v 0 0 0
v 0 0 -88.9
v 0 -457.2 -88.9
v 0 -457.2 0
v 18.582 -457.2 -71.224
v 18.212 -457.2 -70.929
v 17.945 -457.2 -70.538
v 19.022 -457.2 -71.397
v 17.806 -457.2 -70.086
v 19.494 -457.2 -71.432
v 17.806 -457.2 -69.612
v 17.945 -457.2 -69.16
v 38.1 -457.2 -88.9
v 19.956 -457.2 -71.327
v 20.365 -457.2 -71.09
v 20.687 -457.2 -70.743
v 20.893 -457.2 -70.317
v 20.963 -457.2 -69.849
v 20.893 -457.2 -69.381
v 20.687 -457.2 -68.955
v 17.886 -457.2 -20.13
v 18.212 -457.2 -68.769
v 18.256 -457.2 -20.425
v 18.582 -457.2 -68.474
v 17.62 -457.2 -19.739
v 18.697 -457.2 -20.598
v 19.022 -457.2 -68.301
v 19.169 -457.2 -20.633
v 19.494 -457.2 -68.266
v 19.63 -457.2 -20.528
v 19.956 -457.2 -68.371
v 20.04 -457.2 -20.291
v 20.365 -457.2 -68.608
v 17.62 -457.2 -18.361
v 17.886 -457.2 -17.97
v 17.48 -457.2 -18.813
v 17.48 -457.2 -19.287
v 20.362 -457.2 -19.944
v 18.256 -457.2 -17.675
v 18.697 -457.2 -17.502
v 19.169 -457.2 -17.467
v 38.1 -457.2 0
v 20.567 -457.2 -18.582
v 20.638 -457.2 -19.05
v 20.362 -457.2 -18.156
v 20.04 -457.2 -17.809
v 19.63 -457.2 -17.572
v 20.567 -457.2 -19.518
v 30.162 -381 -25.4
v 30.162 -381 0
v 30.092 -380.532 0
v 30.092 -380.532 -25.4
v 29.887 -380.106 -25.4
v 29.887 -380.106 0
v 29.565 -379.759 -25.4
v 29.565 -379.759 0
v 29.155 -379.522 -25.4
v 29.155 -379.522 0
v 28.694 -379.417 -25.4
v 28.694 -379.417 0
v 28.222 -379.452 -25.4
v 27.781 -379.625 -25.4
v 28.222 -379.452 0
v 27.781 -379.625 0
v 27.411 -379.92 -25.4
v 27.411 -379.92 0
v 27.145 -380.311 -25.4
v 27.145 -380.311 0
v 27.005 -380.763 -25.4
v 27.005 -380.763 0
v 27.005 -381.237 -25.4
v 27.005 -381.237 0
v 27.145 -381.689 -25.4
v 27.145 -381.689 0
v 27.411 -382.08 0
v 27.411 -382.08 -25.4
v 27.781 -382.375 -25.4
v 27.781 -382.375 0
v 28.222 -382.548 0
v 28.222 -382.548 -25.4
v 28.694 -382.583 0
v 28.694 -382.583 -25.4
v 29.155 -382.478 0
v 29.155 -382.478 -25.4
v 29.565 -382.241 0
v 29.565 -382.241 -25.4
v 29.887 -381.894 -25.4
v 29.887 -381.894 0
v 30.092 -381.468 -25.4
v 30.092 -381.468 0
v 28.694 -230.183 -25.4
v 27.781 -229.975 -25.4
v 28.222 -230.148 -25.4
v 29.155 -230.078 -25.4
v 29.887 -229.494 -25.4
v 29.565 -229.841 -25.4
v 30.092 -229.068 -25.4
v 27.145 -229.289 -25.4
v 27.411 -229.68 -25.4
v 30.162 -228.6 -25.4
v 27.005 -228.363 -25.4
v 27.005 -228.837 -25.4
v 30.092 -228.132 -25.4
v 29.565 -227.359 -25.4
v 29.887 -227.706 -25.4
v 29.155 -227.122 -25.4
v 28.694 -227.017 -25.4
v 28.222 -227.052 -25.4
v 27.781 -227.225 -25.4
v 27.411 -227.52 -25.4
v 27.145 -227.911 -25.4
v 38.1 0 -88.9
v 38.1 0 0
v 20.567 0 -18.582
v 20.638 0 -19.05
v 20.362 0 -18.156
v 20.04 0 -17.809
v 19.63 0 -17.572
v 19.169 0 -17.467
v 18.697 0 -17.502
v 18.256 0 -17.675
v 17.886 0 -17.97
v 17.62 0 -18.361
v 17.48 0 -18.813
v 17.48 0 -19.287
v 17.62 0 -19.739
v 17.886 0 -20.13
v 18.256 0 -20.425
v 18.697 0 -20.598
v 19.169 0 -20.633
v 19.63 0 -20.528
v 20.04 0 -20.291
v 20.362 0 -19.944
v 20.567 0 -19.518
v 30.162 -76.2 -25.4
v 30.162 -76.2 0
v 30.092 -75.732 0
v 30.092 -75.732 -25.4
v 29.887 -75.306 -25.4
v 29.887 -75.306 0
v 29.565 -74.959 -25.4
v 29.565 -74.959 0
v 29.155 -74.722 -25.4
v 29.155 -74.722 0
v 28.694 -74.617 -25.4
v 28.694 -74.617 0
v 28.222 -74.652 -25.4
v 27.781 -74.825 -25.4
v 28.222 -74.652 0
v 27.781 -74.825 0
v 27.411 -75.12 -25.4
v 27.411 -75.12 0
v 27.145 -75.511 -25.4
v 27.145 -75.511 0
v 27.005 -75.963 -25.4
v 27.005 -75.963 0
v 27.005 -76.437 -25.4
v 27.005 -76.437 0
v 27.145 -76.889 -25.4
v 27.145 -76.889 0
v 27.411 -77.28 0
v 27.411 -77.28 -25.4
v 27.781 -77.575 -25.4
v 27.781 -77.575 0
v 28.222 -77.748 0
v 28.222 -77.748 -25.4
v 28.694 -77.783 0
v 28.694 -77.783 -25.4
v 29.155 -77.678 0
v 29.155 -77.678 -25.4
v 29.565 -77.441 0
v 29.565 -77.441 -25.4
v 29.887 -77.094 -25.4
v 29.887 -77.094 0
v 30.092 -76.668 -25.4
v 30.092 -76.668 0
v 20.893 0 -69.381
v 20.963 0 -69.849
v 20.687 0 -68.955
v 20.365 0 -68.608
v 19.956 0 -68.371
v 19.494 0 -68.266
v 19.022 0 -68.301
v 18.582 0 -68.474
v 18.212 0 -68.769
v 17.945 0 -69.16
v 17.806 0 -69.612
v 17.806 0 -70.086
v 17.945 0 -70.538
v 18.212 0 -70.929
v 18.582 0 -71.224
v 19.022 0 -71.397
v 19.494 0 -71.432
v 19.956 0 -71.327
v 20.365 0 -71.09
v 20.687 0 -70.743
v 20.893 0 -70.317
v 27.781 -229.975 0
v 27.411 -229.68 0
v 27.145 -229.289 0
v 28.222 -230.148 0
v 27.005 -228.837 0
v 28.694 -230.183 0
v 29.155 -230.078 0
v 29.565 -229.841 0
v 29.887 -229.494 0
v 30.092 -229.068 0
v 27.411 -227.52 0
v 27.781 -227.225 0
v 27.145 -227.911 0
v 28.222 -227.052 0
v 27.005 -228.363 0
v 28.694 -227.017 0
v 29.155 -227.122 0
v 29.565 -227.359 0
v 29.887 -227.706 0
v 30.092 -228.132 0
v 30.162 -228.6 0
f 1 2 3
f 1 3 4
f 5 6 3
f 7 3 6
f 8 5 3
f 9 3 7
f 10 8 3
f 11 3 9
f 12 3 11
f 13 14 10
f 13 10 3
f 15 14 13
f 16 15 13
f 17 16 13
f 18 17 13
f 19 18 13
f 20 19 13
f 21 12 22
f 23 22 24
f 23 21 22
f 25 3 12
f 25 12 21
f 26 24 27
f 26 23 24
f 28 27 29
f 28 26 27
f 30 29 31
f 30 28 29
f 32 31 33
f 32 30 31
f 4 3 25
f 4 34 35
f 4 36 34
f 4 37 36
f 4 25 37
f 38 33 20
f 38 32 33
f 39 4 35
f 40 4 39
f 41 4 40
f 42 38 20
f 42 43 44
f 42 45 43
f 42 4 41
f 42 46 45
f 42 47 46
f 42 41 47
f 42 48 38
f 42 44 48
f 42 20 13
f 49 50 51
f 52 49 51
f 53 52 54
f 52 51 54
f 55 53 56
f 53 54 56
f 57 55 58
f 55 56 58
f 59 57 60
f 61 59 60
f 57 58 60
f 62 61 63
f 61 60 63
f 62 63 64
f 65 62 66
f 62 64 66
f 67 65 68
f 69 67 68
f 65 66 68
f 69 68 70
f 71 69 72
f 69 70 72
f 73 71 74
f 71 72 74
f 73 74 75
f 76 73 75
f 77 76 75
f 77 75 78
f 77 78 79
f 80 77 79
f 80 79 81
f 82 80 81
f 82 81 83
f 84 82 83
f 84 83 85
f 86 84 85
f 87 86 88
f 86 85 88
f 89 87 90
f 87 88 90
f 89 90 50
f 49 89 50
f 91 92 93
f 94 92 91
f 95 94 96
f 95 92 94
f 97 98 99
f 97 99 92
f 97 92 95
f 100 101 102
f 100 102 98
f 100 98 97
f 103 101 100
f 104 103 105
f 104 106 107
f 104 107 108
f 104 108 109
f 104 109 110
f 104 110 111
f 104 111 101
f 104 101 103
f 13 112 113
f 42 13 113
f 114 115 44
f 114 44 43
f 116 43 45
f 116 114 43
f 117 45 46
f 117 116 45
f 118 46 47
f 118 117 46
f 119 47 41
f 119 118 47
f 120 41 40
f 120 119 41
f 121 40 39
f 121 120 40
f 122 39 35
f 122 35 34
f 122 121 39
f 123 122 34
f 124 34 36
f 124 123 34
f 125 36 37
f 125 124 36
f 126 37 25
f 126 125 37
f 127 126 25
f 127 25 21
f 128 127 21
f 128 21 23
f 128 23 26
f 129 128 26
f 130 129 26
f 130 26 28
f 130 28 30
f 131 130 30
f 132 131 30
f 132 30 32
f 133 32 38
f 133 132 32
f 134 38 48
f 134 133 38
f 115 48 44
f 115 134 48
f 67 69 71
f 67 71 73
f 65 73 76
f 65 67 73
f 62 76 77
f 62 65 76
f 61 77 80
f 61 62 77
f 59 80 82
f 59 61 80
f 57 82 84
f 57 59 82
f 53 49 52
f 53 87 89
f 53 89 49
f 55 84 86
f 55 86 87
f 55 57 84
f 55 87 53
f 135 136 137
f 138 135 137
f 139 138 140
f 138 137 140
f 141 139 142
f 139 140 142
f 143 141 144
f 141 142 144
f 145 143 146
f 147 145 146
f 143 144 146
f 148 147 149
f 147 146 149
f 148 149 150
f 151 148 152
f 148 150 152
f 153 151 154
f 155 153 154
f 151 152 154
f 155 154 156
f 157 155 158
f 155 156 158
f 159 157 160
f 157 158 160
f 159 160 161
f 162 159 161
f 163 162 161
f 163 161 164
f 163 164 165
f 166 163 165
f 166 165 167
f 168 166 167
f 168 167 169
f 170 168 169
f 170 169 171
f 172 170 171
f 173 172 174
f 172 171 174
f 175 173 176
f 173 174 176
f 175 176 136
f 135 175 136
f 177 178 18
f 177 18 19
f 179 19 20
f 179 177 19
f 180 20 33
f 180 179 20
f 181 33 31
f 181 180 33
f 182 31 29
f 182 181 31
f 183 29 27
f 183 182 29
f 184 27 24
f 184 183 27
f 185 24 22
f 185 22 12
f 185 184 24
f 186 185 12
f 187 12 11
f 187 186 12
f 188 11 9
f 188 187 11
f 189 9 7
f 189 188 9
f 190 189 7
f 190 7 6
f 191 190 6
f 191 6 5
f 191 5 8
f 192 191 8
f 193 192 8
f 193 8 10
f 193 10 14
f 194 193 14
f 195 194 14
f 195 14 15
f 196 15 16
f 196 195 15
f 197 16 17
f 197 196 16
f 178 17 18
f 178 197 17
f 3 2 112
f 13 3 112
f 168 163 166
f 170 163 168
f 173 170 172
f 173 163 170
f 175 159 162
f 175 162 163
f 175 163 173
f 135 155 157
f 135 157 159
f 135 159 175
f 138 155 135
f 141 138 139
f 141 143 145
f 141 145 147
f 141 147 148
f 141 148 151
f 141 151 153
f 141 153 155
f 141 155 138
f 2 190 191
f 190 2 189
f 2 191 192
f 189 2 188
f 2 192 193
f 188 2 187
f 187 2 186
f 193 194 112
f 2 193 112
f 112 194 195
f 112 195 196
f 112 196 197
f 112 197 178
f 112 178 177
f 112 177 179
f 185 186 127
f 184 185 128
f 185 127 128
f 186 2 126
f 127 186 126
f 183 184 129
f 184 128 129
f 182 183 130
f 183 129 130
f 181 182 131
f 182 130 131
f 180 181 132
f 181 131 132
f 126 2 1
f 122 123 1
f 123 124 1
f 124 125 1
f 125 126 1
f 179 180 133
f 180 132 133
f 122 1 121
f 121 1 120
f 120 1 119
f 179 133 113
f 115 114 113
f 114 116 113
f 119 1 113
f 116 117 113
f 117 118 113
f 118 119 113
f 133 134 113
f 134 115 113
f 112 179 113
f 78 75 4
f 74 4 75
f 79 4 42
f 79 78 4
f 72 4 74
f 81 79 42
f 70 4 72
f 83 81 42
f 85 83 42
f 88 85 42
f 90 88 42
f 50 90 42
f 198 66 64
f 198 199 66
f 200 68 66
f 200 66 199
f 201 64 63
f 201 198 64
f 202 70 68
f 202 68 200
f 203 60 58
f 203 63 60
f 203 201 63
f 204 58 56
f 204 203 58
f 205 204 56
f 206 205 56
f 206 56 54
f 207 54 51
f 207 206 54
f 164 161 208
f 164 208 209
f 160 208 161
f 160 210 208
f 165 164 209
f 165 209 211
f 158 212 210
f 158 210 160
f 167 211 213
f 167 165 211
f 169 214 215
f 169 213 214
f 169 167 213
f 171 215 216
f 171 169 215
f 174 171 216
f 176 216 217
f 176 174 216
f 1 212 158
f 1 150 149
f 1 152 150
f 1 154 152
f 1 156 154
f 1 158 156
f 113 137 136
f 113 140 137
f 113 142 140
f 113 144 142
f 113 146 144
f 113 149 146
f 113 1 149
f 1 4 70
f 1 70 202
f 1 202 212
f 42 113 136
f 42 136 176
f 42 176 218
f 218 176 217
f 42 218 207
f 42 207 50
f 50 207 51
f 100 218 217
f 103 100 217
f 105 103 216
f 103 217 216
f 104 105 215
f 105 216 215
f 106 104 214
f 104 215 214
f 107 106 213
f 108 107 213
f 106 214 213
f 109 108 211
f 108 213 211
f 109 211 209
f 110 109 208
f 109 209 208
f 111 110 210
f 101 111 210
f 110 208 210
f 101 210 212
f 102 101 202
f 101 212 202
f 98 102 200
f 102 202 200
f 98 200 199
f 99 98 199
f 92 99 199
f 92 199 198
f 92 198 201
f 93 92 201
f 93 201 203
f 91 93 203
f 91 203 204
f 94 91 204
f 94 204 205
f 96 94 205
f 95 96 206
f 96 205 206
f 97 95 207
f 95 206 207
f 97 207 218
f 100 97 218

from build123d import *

# Parameters (mm, degrees)
F0_W     = 38.1
F0_H     = 88.9
F1_DEPTH = 457.2
F2_R     = 1.5875
F3_DEPTH = 457.2
F4_R     = 1.5875
F5_DEPTH = 25.4


with BuildPart() as f1:
    # F0 (on Front) → F1 (new body)
    with BuildSketch(Plane.XZ):
        with Locations((19.05, -44.45)):
            Rectangle(F0_W, F0_H)
    extrude(amount=F1_DEPTH)

    # F2 (on Front) → F3 (cut)
    with BuildSketch(Plane.XZ):
        with Locations((19.05, -19.05)):
            Circle(F2_R)
        with Locations((19.375634, -69.848956)):
            Circle(F2_R)
    extrude(amount=F3_DEPTH, mode=Mode.SUBTRACT)

    # F4 (on Top) → F5 (cut)
    with BuildSketch(Plane.XY):
        with Locations((28.575, -76.2)):
            Circle(F4_R)
        with Locations((28.575, -228.6)):
            Circle(F4_R)
        with Locations((28.575, -381)):
            Circle(F4_R)
    extrude(amount=-F5_DEPTH, mode=Mode.SUBTRACT)


solid = f1.part
